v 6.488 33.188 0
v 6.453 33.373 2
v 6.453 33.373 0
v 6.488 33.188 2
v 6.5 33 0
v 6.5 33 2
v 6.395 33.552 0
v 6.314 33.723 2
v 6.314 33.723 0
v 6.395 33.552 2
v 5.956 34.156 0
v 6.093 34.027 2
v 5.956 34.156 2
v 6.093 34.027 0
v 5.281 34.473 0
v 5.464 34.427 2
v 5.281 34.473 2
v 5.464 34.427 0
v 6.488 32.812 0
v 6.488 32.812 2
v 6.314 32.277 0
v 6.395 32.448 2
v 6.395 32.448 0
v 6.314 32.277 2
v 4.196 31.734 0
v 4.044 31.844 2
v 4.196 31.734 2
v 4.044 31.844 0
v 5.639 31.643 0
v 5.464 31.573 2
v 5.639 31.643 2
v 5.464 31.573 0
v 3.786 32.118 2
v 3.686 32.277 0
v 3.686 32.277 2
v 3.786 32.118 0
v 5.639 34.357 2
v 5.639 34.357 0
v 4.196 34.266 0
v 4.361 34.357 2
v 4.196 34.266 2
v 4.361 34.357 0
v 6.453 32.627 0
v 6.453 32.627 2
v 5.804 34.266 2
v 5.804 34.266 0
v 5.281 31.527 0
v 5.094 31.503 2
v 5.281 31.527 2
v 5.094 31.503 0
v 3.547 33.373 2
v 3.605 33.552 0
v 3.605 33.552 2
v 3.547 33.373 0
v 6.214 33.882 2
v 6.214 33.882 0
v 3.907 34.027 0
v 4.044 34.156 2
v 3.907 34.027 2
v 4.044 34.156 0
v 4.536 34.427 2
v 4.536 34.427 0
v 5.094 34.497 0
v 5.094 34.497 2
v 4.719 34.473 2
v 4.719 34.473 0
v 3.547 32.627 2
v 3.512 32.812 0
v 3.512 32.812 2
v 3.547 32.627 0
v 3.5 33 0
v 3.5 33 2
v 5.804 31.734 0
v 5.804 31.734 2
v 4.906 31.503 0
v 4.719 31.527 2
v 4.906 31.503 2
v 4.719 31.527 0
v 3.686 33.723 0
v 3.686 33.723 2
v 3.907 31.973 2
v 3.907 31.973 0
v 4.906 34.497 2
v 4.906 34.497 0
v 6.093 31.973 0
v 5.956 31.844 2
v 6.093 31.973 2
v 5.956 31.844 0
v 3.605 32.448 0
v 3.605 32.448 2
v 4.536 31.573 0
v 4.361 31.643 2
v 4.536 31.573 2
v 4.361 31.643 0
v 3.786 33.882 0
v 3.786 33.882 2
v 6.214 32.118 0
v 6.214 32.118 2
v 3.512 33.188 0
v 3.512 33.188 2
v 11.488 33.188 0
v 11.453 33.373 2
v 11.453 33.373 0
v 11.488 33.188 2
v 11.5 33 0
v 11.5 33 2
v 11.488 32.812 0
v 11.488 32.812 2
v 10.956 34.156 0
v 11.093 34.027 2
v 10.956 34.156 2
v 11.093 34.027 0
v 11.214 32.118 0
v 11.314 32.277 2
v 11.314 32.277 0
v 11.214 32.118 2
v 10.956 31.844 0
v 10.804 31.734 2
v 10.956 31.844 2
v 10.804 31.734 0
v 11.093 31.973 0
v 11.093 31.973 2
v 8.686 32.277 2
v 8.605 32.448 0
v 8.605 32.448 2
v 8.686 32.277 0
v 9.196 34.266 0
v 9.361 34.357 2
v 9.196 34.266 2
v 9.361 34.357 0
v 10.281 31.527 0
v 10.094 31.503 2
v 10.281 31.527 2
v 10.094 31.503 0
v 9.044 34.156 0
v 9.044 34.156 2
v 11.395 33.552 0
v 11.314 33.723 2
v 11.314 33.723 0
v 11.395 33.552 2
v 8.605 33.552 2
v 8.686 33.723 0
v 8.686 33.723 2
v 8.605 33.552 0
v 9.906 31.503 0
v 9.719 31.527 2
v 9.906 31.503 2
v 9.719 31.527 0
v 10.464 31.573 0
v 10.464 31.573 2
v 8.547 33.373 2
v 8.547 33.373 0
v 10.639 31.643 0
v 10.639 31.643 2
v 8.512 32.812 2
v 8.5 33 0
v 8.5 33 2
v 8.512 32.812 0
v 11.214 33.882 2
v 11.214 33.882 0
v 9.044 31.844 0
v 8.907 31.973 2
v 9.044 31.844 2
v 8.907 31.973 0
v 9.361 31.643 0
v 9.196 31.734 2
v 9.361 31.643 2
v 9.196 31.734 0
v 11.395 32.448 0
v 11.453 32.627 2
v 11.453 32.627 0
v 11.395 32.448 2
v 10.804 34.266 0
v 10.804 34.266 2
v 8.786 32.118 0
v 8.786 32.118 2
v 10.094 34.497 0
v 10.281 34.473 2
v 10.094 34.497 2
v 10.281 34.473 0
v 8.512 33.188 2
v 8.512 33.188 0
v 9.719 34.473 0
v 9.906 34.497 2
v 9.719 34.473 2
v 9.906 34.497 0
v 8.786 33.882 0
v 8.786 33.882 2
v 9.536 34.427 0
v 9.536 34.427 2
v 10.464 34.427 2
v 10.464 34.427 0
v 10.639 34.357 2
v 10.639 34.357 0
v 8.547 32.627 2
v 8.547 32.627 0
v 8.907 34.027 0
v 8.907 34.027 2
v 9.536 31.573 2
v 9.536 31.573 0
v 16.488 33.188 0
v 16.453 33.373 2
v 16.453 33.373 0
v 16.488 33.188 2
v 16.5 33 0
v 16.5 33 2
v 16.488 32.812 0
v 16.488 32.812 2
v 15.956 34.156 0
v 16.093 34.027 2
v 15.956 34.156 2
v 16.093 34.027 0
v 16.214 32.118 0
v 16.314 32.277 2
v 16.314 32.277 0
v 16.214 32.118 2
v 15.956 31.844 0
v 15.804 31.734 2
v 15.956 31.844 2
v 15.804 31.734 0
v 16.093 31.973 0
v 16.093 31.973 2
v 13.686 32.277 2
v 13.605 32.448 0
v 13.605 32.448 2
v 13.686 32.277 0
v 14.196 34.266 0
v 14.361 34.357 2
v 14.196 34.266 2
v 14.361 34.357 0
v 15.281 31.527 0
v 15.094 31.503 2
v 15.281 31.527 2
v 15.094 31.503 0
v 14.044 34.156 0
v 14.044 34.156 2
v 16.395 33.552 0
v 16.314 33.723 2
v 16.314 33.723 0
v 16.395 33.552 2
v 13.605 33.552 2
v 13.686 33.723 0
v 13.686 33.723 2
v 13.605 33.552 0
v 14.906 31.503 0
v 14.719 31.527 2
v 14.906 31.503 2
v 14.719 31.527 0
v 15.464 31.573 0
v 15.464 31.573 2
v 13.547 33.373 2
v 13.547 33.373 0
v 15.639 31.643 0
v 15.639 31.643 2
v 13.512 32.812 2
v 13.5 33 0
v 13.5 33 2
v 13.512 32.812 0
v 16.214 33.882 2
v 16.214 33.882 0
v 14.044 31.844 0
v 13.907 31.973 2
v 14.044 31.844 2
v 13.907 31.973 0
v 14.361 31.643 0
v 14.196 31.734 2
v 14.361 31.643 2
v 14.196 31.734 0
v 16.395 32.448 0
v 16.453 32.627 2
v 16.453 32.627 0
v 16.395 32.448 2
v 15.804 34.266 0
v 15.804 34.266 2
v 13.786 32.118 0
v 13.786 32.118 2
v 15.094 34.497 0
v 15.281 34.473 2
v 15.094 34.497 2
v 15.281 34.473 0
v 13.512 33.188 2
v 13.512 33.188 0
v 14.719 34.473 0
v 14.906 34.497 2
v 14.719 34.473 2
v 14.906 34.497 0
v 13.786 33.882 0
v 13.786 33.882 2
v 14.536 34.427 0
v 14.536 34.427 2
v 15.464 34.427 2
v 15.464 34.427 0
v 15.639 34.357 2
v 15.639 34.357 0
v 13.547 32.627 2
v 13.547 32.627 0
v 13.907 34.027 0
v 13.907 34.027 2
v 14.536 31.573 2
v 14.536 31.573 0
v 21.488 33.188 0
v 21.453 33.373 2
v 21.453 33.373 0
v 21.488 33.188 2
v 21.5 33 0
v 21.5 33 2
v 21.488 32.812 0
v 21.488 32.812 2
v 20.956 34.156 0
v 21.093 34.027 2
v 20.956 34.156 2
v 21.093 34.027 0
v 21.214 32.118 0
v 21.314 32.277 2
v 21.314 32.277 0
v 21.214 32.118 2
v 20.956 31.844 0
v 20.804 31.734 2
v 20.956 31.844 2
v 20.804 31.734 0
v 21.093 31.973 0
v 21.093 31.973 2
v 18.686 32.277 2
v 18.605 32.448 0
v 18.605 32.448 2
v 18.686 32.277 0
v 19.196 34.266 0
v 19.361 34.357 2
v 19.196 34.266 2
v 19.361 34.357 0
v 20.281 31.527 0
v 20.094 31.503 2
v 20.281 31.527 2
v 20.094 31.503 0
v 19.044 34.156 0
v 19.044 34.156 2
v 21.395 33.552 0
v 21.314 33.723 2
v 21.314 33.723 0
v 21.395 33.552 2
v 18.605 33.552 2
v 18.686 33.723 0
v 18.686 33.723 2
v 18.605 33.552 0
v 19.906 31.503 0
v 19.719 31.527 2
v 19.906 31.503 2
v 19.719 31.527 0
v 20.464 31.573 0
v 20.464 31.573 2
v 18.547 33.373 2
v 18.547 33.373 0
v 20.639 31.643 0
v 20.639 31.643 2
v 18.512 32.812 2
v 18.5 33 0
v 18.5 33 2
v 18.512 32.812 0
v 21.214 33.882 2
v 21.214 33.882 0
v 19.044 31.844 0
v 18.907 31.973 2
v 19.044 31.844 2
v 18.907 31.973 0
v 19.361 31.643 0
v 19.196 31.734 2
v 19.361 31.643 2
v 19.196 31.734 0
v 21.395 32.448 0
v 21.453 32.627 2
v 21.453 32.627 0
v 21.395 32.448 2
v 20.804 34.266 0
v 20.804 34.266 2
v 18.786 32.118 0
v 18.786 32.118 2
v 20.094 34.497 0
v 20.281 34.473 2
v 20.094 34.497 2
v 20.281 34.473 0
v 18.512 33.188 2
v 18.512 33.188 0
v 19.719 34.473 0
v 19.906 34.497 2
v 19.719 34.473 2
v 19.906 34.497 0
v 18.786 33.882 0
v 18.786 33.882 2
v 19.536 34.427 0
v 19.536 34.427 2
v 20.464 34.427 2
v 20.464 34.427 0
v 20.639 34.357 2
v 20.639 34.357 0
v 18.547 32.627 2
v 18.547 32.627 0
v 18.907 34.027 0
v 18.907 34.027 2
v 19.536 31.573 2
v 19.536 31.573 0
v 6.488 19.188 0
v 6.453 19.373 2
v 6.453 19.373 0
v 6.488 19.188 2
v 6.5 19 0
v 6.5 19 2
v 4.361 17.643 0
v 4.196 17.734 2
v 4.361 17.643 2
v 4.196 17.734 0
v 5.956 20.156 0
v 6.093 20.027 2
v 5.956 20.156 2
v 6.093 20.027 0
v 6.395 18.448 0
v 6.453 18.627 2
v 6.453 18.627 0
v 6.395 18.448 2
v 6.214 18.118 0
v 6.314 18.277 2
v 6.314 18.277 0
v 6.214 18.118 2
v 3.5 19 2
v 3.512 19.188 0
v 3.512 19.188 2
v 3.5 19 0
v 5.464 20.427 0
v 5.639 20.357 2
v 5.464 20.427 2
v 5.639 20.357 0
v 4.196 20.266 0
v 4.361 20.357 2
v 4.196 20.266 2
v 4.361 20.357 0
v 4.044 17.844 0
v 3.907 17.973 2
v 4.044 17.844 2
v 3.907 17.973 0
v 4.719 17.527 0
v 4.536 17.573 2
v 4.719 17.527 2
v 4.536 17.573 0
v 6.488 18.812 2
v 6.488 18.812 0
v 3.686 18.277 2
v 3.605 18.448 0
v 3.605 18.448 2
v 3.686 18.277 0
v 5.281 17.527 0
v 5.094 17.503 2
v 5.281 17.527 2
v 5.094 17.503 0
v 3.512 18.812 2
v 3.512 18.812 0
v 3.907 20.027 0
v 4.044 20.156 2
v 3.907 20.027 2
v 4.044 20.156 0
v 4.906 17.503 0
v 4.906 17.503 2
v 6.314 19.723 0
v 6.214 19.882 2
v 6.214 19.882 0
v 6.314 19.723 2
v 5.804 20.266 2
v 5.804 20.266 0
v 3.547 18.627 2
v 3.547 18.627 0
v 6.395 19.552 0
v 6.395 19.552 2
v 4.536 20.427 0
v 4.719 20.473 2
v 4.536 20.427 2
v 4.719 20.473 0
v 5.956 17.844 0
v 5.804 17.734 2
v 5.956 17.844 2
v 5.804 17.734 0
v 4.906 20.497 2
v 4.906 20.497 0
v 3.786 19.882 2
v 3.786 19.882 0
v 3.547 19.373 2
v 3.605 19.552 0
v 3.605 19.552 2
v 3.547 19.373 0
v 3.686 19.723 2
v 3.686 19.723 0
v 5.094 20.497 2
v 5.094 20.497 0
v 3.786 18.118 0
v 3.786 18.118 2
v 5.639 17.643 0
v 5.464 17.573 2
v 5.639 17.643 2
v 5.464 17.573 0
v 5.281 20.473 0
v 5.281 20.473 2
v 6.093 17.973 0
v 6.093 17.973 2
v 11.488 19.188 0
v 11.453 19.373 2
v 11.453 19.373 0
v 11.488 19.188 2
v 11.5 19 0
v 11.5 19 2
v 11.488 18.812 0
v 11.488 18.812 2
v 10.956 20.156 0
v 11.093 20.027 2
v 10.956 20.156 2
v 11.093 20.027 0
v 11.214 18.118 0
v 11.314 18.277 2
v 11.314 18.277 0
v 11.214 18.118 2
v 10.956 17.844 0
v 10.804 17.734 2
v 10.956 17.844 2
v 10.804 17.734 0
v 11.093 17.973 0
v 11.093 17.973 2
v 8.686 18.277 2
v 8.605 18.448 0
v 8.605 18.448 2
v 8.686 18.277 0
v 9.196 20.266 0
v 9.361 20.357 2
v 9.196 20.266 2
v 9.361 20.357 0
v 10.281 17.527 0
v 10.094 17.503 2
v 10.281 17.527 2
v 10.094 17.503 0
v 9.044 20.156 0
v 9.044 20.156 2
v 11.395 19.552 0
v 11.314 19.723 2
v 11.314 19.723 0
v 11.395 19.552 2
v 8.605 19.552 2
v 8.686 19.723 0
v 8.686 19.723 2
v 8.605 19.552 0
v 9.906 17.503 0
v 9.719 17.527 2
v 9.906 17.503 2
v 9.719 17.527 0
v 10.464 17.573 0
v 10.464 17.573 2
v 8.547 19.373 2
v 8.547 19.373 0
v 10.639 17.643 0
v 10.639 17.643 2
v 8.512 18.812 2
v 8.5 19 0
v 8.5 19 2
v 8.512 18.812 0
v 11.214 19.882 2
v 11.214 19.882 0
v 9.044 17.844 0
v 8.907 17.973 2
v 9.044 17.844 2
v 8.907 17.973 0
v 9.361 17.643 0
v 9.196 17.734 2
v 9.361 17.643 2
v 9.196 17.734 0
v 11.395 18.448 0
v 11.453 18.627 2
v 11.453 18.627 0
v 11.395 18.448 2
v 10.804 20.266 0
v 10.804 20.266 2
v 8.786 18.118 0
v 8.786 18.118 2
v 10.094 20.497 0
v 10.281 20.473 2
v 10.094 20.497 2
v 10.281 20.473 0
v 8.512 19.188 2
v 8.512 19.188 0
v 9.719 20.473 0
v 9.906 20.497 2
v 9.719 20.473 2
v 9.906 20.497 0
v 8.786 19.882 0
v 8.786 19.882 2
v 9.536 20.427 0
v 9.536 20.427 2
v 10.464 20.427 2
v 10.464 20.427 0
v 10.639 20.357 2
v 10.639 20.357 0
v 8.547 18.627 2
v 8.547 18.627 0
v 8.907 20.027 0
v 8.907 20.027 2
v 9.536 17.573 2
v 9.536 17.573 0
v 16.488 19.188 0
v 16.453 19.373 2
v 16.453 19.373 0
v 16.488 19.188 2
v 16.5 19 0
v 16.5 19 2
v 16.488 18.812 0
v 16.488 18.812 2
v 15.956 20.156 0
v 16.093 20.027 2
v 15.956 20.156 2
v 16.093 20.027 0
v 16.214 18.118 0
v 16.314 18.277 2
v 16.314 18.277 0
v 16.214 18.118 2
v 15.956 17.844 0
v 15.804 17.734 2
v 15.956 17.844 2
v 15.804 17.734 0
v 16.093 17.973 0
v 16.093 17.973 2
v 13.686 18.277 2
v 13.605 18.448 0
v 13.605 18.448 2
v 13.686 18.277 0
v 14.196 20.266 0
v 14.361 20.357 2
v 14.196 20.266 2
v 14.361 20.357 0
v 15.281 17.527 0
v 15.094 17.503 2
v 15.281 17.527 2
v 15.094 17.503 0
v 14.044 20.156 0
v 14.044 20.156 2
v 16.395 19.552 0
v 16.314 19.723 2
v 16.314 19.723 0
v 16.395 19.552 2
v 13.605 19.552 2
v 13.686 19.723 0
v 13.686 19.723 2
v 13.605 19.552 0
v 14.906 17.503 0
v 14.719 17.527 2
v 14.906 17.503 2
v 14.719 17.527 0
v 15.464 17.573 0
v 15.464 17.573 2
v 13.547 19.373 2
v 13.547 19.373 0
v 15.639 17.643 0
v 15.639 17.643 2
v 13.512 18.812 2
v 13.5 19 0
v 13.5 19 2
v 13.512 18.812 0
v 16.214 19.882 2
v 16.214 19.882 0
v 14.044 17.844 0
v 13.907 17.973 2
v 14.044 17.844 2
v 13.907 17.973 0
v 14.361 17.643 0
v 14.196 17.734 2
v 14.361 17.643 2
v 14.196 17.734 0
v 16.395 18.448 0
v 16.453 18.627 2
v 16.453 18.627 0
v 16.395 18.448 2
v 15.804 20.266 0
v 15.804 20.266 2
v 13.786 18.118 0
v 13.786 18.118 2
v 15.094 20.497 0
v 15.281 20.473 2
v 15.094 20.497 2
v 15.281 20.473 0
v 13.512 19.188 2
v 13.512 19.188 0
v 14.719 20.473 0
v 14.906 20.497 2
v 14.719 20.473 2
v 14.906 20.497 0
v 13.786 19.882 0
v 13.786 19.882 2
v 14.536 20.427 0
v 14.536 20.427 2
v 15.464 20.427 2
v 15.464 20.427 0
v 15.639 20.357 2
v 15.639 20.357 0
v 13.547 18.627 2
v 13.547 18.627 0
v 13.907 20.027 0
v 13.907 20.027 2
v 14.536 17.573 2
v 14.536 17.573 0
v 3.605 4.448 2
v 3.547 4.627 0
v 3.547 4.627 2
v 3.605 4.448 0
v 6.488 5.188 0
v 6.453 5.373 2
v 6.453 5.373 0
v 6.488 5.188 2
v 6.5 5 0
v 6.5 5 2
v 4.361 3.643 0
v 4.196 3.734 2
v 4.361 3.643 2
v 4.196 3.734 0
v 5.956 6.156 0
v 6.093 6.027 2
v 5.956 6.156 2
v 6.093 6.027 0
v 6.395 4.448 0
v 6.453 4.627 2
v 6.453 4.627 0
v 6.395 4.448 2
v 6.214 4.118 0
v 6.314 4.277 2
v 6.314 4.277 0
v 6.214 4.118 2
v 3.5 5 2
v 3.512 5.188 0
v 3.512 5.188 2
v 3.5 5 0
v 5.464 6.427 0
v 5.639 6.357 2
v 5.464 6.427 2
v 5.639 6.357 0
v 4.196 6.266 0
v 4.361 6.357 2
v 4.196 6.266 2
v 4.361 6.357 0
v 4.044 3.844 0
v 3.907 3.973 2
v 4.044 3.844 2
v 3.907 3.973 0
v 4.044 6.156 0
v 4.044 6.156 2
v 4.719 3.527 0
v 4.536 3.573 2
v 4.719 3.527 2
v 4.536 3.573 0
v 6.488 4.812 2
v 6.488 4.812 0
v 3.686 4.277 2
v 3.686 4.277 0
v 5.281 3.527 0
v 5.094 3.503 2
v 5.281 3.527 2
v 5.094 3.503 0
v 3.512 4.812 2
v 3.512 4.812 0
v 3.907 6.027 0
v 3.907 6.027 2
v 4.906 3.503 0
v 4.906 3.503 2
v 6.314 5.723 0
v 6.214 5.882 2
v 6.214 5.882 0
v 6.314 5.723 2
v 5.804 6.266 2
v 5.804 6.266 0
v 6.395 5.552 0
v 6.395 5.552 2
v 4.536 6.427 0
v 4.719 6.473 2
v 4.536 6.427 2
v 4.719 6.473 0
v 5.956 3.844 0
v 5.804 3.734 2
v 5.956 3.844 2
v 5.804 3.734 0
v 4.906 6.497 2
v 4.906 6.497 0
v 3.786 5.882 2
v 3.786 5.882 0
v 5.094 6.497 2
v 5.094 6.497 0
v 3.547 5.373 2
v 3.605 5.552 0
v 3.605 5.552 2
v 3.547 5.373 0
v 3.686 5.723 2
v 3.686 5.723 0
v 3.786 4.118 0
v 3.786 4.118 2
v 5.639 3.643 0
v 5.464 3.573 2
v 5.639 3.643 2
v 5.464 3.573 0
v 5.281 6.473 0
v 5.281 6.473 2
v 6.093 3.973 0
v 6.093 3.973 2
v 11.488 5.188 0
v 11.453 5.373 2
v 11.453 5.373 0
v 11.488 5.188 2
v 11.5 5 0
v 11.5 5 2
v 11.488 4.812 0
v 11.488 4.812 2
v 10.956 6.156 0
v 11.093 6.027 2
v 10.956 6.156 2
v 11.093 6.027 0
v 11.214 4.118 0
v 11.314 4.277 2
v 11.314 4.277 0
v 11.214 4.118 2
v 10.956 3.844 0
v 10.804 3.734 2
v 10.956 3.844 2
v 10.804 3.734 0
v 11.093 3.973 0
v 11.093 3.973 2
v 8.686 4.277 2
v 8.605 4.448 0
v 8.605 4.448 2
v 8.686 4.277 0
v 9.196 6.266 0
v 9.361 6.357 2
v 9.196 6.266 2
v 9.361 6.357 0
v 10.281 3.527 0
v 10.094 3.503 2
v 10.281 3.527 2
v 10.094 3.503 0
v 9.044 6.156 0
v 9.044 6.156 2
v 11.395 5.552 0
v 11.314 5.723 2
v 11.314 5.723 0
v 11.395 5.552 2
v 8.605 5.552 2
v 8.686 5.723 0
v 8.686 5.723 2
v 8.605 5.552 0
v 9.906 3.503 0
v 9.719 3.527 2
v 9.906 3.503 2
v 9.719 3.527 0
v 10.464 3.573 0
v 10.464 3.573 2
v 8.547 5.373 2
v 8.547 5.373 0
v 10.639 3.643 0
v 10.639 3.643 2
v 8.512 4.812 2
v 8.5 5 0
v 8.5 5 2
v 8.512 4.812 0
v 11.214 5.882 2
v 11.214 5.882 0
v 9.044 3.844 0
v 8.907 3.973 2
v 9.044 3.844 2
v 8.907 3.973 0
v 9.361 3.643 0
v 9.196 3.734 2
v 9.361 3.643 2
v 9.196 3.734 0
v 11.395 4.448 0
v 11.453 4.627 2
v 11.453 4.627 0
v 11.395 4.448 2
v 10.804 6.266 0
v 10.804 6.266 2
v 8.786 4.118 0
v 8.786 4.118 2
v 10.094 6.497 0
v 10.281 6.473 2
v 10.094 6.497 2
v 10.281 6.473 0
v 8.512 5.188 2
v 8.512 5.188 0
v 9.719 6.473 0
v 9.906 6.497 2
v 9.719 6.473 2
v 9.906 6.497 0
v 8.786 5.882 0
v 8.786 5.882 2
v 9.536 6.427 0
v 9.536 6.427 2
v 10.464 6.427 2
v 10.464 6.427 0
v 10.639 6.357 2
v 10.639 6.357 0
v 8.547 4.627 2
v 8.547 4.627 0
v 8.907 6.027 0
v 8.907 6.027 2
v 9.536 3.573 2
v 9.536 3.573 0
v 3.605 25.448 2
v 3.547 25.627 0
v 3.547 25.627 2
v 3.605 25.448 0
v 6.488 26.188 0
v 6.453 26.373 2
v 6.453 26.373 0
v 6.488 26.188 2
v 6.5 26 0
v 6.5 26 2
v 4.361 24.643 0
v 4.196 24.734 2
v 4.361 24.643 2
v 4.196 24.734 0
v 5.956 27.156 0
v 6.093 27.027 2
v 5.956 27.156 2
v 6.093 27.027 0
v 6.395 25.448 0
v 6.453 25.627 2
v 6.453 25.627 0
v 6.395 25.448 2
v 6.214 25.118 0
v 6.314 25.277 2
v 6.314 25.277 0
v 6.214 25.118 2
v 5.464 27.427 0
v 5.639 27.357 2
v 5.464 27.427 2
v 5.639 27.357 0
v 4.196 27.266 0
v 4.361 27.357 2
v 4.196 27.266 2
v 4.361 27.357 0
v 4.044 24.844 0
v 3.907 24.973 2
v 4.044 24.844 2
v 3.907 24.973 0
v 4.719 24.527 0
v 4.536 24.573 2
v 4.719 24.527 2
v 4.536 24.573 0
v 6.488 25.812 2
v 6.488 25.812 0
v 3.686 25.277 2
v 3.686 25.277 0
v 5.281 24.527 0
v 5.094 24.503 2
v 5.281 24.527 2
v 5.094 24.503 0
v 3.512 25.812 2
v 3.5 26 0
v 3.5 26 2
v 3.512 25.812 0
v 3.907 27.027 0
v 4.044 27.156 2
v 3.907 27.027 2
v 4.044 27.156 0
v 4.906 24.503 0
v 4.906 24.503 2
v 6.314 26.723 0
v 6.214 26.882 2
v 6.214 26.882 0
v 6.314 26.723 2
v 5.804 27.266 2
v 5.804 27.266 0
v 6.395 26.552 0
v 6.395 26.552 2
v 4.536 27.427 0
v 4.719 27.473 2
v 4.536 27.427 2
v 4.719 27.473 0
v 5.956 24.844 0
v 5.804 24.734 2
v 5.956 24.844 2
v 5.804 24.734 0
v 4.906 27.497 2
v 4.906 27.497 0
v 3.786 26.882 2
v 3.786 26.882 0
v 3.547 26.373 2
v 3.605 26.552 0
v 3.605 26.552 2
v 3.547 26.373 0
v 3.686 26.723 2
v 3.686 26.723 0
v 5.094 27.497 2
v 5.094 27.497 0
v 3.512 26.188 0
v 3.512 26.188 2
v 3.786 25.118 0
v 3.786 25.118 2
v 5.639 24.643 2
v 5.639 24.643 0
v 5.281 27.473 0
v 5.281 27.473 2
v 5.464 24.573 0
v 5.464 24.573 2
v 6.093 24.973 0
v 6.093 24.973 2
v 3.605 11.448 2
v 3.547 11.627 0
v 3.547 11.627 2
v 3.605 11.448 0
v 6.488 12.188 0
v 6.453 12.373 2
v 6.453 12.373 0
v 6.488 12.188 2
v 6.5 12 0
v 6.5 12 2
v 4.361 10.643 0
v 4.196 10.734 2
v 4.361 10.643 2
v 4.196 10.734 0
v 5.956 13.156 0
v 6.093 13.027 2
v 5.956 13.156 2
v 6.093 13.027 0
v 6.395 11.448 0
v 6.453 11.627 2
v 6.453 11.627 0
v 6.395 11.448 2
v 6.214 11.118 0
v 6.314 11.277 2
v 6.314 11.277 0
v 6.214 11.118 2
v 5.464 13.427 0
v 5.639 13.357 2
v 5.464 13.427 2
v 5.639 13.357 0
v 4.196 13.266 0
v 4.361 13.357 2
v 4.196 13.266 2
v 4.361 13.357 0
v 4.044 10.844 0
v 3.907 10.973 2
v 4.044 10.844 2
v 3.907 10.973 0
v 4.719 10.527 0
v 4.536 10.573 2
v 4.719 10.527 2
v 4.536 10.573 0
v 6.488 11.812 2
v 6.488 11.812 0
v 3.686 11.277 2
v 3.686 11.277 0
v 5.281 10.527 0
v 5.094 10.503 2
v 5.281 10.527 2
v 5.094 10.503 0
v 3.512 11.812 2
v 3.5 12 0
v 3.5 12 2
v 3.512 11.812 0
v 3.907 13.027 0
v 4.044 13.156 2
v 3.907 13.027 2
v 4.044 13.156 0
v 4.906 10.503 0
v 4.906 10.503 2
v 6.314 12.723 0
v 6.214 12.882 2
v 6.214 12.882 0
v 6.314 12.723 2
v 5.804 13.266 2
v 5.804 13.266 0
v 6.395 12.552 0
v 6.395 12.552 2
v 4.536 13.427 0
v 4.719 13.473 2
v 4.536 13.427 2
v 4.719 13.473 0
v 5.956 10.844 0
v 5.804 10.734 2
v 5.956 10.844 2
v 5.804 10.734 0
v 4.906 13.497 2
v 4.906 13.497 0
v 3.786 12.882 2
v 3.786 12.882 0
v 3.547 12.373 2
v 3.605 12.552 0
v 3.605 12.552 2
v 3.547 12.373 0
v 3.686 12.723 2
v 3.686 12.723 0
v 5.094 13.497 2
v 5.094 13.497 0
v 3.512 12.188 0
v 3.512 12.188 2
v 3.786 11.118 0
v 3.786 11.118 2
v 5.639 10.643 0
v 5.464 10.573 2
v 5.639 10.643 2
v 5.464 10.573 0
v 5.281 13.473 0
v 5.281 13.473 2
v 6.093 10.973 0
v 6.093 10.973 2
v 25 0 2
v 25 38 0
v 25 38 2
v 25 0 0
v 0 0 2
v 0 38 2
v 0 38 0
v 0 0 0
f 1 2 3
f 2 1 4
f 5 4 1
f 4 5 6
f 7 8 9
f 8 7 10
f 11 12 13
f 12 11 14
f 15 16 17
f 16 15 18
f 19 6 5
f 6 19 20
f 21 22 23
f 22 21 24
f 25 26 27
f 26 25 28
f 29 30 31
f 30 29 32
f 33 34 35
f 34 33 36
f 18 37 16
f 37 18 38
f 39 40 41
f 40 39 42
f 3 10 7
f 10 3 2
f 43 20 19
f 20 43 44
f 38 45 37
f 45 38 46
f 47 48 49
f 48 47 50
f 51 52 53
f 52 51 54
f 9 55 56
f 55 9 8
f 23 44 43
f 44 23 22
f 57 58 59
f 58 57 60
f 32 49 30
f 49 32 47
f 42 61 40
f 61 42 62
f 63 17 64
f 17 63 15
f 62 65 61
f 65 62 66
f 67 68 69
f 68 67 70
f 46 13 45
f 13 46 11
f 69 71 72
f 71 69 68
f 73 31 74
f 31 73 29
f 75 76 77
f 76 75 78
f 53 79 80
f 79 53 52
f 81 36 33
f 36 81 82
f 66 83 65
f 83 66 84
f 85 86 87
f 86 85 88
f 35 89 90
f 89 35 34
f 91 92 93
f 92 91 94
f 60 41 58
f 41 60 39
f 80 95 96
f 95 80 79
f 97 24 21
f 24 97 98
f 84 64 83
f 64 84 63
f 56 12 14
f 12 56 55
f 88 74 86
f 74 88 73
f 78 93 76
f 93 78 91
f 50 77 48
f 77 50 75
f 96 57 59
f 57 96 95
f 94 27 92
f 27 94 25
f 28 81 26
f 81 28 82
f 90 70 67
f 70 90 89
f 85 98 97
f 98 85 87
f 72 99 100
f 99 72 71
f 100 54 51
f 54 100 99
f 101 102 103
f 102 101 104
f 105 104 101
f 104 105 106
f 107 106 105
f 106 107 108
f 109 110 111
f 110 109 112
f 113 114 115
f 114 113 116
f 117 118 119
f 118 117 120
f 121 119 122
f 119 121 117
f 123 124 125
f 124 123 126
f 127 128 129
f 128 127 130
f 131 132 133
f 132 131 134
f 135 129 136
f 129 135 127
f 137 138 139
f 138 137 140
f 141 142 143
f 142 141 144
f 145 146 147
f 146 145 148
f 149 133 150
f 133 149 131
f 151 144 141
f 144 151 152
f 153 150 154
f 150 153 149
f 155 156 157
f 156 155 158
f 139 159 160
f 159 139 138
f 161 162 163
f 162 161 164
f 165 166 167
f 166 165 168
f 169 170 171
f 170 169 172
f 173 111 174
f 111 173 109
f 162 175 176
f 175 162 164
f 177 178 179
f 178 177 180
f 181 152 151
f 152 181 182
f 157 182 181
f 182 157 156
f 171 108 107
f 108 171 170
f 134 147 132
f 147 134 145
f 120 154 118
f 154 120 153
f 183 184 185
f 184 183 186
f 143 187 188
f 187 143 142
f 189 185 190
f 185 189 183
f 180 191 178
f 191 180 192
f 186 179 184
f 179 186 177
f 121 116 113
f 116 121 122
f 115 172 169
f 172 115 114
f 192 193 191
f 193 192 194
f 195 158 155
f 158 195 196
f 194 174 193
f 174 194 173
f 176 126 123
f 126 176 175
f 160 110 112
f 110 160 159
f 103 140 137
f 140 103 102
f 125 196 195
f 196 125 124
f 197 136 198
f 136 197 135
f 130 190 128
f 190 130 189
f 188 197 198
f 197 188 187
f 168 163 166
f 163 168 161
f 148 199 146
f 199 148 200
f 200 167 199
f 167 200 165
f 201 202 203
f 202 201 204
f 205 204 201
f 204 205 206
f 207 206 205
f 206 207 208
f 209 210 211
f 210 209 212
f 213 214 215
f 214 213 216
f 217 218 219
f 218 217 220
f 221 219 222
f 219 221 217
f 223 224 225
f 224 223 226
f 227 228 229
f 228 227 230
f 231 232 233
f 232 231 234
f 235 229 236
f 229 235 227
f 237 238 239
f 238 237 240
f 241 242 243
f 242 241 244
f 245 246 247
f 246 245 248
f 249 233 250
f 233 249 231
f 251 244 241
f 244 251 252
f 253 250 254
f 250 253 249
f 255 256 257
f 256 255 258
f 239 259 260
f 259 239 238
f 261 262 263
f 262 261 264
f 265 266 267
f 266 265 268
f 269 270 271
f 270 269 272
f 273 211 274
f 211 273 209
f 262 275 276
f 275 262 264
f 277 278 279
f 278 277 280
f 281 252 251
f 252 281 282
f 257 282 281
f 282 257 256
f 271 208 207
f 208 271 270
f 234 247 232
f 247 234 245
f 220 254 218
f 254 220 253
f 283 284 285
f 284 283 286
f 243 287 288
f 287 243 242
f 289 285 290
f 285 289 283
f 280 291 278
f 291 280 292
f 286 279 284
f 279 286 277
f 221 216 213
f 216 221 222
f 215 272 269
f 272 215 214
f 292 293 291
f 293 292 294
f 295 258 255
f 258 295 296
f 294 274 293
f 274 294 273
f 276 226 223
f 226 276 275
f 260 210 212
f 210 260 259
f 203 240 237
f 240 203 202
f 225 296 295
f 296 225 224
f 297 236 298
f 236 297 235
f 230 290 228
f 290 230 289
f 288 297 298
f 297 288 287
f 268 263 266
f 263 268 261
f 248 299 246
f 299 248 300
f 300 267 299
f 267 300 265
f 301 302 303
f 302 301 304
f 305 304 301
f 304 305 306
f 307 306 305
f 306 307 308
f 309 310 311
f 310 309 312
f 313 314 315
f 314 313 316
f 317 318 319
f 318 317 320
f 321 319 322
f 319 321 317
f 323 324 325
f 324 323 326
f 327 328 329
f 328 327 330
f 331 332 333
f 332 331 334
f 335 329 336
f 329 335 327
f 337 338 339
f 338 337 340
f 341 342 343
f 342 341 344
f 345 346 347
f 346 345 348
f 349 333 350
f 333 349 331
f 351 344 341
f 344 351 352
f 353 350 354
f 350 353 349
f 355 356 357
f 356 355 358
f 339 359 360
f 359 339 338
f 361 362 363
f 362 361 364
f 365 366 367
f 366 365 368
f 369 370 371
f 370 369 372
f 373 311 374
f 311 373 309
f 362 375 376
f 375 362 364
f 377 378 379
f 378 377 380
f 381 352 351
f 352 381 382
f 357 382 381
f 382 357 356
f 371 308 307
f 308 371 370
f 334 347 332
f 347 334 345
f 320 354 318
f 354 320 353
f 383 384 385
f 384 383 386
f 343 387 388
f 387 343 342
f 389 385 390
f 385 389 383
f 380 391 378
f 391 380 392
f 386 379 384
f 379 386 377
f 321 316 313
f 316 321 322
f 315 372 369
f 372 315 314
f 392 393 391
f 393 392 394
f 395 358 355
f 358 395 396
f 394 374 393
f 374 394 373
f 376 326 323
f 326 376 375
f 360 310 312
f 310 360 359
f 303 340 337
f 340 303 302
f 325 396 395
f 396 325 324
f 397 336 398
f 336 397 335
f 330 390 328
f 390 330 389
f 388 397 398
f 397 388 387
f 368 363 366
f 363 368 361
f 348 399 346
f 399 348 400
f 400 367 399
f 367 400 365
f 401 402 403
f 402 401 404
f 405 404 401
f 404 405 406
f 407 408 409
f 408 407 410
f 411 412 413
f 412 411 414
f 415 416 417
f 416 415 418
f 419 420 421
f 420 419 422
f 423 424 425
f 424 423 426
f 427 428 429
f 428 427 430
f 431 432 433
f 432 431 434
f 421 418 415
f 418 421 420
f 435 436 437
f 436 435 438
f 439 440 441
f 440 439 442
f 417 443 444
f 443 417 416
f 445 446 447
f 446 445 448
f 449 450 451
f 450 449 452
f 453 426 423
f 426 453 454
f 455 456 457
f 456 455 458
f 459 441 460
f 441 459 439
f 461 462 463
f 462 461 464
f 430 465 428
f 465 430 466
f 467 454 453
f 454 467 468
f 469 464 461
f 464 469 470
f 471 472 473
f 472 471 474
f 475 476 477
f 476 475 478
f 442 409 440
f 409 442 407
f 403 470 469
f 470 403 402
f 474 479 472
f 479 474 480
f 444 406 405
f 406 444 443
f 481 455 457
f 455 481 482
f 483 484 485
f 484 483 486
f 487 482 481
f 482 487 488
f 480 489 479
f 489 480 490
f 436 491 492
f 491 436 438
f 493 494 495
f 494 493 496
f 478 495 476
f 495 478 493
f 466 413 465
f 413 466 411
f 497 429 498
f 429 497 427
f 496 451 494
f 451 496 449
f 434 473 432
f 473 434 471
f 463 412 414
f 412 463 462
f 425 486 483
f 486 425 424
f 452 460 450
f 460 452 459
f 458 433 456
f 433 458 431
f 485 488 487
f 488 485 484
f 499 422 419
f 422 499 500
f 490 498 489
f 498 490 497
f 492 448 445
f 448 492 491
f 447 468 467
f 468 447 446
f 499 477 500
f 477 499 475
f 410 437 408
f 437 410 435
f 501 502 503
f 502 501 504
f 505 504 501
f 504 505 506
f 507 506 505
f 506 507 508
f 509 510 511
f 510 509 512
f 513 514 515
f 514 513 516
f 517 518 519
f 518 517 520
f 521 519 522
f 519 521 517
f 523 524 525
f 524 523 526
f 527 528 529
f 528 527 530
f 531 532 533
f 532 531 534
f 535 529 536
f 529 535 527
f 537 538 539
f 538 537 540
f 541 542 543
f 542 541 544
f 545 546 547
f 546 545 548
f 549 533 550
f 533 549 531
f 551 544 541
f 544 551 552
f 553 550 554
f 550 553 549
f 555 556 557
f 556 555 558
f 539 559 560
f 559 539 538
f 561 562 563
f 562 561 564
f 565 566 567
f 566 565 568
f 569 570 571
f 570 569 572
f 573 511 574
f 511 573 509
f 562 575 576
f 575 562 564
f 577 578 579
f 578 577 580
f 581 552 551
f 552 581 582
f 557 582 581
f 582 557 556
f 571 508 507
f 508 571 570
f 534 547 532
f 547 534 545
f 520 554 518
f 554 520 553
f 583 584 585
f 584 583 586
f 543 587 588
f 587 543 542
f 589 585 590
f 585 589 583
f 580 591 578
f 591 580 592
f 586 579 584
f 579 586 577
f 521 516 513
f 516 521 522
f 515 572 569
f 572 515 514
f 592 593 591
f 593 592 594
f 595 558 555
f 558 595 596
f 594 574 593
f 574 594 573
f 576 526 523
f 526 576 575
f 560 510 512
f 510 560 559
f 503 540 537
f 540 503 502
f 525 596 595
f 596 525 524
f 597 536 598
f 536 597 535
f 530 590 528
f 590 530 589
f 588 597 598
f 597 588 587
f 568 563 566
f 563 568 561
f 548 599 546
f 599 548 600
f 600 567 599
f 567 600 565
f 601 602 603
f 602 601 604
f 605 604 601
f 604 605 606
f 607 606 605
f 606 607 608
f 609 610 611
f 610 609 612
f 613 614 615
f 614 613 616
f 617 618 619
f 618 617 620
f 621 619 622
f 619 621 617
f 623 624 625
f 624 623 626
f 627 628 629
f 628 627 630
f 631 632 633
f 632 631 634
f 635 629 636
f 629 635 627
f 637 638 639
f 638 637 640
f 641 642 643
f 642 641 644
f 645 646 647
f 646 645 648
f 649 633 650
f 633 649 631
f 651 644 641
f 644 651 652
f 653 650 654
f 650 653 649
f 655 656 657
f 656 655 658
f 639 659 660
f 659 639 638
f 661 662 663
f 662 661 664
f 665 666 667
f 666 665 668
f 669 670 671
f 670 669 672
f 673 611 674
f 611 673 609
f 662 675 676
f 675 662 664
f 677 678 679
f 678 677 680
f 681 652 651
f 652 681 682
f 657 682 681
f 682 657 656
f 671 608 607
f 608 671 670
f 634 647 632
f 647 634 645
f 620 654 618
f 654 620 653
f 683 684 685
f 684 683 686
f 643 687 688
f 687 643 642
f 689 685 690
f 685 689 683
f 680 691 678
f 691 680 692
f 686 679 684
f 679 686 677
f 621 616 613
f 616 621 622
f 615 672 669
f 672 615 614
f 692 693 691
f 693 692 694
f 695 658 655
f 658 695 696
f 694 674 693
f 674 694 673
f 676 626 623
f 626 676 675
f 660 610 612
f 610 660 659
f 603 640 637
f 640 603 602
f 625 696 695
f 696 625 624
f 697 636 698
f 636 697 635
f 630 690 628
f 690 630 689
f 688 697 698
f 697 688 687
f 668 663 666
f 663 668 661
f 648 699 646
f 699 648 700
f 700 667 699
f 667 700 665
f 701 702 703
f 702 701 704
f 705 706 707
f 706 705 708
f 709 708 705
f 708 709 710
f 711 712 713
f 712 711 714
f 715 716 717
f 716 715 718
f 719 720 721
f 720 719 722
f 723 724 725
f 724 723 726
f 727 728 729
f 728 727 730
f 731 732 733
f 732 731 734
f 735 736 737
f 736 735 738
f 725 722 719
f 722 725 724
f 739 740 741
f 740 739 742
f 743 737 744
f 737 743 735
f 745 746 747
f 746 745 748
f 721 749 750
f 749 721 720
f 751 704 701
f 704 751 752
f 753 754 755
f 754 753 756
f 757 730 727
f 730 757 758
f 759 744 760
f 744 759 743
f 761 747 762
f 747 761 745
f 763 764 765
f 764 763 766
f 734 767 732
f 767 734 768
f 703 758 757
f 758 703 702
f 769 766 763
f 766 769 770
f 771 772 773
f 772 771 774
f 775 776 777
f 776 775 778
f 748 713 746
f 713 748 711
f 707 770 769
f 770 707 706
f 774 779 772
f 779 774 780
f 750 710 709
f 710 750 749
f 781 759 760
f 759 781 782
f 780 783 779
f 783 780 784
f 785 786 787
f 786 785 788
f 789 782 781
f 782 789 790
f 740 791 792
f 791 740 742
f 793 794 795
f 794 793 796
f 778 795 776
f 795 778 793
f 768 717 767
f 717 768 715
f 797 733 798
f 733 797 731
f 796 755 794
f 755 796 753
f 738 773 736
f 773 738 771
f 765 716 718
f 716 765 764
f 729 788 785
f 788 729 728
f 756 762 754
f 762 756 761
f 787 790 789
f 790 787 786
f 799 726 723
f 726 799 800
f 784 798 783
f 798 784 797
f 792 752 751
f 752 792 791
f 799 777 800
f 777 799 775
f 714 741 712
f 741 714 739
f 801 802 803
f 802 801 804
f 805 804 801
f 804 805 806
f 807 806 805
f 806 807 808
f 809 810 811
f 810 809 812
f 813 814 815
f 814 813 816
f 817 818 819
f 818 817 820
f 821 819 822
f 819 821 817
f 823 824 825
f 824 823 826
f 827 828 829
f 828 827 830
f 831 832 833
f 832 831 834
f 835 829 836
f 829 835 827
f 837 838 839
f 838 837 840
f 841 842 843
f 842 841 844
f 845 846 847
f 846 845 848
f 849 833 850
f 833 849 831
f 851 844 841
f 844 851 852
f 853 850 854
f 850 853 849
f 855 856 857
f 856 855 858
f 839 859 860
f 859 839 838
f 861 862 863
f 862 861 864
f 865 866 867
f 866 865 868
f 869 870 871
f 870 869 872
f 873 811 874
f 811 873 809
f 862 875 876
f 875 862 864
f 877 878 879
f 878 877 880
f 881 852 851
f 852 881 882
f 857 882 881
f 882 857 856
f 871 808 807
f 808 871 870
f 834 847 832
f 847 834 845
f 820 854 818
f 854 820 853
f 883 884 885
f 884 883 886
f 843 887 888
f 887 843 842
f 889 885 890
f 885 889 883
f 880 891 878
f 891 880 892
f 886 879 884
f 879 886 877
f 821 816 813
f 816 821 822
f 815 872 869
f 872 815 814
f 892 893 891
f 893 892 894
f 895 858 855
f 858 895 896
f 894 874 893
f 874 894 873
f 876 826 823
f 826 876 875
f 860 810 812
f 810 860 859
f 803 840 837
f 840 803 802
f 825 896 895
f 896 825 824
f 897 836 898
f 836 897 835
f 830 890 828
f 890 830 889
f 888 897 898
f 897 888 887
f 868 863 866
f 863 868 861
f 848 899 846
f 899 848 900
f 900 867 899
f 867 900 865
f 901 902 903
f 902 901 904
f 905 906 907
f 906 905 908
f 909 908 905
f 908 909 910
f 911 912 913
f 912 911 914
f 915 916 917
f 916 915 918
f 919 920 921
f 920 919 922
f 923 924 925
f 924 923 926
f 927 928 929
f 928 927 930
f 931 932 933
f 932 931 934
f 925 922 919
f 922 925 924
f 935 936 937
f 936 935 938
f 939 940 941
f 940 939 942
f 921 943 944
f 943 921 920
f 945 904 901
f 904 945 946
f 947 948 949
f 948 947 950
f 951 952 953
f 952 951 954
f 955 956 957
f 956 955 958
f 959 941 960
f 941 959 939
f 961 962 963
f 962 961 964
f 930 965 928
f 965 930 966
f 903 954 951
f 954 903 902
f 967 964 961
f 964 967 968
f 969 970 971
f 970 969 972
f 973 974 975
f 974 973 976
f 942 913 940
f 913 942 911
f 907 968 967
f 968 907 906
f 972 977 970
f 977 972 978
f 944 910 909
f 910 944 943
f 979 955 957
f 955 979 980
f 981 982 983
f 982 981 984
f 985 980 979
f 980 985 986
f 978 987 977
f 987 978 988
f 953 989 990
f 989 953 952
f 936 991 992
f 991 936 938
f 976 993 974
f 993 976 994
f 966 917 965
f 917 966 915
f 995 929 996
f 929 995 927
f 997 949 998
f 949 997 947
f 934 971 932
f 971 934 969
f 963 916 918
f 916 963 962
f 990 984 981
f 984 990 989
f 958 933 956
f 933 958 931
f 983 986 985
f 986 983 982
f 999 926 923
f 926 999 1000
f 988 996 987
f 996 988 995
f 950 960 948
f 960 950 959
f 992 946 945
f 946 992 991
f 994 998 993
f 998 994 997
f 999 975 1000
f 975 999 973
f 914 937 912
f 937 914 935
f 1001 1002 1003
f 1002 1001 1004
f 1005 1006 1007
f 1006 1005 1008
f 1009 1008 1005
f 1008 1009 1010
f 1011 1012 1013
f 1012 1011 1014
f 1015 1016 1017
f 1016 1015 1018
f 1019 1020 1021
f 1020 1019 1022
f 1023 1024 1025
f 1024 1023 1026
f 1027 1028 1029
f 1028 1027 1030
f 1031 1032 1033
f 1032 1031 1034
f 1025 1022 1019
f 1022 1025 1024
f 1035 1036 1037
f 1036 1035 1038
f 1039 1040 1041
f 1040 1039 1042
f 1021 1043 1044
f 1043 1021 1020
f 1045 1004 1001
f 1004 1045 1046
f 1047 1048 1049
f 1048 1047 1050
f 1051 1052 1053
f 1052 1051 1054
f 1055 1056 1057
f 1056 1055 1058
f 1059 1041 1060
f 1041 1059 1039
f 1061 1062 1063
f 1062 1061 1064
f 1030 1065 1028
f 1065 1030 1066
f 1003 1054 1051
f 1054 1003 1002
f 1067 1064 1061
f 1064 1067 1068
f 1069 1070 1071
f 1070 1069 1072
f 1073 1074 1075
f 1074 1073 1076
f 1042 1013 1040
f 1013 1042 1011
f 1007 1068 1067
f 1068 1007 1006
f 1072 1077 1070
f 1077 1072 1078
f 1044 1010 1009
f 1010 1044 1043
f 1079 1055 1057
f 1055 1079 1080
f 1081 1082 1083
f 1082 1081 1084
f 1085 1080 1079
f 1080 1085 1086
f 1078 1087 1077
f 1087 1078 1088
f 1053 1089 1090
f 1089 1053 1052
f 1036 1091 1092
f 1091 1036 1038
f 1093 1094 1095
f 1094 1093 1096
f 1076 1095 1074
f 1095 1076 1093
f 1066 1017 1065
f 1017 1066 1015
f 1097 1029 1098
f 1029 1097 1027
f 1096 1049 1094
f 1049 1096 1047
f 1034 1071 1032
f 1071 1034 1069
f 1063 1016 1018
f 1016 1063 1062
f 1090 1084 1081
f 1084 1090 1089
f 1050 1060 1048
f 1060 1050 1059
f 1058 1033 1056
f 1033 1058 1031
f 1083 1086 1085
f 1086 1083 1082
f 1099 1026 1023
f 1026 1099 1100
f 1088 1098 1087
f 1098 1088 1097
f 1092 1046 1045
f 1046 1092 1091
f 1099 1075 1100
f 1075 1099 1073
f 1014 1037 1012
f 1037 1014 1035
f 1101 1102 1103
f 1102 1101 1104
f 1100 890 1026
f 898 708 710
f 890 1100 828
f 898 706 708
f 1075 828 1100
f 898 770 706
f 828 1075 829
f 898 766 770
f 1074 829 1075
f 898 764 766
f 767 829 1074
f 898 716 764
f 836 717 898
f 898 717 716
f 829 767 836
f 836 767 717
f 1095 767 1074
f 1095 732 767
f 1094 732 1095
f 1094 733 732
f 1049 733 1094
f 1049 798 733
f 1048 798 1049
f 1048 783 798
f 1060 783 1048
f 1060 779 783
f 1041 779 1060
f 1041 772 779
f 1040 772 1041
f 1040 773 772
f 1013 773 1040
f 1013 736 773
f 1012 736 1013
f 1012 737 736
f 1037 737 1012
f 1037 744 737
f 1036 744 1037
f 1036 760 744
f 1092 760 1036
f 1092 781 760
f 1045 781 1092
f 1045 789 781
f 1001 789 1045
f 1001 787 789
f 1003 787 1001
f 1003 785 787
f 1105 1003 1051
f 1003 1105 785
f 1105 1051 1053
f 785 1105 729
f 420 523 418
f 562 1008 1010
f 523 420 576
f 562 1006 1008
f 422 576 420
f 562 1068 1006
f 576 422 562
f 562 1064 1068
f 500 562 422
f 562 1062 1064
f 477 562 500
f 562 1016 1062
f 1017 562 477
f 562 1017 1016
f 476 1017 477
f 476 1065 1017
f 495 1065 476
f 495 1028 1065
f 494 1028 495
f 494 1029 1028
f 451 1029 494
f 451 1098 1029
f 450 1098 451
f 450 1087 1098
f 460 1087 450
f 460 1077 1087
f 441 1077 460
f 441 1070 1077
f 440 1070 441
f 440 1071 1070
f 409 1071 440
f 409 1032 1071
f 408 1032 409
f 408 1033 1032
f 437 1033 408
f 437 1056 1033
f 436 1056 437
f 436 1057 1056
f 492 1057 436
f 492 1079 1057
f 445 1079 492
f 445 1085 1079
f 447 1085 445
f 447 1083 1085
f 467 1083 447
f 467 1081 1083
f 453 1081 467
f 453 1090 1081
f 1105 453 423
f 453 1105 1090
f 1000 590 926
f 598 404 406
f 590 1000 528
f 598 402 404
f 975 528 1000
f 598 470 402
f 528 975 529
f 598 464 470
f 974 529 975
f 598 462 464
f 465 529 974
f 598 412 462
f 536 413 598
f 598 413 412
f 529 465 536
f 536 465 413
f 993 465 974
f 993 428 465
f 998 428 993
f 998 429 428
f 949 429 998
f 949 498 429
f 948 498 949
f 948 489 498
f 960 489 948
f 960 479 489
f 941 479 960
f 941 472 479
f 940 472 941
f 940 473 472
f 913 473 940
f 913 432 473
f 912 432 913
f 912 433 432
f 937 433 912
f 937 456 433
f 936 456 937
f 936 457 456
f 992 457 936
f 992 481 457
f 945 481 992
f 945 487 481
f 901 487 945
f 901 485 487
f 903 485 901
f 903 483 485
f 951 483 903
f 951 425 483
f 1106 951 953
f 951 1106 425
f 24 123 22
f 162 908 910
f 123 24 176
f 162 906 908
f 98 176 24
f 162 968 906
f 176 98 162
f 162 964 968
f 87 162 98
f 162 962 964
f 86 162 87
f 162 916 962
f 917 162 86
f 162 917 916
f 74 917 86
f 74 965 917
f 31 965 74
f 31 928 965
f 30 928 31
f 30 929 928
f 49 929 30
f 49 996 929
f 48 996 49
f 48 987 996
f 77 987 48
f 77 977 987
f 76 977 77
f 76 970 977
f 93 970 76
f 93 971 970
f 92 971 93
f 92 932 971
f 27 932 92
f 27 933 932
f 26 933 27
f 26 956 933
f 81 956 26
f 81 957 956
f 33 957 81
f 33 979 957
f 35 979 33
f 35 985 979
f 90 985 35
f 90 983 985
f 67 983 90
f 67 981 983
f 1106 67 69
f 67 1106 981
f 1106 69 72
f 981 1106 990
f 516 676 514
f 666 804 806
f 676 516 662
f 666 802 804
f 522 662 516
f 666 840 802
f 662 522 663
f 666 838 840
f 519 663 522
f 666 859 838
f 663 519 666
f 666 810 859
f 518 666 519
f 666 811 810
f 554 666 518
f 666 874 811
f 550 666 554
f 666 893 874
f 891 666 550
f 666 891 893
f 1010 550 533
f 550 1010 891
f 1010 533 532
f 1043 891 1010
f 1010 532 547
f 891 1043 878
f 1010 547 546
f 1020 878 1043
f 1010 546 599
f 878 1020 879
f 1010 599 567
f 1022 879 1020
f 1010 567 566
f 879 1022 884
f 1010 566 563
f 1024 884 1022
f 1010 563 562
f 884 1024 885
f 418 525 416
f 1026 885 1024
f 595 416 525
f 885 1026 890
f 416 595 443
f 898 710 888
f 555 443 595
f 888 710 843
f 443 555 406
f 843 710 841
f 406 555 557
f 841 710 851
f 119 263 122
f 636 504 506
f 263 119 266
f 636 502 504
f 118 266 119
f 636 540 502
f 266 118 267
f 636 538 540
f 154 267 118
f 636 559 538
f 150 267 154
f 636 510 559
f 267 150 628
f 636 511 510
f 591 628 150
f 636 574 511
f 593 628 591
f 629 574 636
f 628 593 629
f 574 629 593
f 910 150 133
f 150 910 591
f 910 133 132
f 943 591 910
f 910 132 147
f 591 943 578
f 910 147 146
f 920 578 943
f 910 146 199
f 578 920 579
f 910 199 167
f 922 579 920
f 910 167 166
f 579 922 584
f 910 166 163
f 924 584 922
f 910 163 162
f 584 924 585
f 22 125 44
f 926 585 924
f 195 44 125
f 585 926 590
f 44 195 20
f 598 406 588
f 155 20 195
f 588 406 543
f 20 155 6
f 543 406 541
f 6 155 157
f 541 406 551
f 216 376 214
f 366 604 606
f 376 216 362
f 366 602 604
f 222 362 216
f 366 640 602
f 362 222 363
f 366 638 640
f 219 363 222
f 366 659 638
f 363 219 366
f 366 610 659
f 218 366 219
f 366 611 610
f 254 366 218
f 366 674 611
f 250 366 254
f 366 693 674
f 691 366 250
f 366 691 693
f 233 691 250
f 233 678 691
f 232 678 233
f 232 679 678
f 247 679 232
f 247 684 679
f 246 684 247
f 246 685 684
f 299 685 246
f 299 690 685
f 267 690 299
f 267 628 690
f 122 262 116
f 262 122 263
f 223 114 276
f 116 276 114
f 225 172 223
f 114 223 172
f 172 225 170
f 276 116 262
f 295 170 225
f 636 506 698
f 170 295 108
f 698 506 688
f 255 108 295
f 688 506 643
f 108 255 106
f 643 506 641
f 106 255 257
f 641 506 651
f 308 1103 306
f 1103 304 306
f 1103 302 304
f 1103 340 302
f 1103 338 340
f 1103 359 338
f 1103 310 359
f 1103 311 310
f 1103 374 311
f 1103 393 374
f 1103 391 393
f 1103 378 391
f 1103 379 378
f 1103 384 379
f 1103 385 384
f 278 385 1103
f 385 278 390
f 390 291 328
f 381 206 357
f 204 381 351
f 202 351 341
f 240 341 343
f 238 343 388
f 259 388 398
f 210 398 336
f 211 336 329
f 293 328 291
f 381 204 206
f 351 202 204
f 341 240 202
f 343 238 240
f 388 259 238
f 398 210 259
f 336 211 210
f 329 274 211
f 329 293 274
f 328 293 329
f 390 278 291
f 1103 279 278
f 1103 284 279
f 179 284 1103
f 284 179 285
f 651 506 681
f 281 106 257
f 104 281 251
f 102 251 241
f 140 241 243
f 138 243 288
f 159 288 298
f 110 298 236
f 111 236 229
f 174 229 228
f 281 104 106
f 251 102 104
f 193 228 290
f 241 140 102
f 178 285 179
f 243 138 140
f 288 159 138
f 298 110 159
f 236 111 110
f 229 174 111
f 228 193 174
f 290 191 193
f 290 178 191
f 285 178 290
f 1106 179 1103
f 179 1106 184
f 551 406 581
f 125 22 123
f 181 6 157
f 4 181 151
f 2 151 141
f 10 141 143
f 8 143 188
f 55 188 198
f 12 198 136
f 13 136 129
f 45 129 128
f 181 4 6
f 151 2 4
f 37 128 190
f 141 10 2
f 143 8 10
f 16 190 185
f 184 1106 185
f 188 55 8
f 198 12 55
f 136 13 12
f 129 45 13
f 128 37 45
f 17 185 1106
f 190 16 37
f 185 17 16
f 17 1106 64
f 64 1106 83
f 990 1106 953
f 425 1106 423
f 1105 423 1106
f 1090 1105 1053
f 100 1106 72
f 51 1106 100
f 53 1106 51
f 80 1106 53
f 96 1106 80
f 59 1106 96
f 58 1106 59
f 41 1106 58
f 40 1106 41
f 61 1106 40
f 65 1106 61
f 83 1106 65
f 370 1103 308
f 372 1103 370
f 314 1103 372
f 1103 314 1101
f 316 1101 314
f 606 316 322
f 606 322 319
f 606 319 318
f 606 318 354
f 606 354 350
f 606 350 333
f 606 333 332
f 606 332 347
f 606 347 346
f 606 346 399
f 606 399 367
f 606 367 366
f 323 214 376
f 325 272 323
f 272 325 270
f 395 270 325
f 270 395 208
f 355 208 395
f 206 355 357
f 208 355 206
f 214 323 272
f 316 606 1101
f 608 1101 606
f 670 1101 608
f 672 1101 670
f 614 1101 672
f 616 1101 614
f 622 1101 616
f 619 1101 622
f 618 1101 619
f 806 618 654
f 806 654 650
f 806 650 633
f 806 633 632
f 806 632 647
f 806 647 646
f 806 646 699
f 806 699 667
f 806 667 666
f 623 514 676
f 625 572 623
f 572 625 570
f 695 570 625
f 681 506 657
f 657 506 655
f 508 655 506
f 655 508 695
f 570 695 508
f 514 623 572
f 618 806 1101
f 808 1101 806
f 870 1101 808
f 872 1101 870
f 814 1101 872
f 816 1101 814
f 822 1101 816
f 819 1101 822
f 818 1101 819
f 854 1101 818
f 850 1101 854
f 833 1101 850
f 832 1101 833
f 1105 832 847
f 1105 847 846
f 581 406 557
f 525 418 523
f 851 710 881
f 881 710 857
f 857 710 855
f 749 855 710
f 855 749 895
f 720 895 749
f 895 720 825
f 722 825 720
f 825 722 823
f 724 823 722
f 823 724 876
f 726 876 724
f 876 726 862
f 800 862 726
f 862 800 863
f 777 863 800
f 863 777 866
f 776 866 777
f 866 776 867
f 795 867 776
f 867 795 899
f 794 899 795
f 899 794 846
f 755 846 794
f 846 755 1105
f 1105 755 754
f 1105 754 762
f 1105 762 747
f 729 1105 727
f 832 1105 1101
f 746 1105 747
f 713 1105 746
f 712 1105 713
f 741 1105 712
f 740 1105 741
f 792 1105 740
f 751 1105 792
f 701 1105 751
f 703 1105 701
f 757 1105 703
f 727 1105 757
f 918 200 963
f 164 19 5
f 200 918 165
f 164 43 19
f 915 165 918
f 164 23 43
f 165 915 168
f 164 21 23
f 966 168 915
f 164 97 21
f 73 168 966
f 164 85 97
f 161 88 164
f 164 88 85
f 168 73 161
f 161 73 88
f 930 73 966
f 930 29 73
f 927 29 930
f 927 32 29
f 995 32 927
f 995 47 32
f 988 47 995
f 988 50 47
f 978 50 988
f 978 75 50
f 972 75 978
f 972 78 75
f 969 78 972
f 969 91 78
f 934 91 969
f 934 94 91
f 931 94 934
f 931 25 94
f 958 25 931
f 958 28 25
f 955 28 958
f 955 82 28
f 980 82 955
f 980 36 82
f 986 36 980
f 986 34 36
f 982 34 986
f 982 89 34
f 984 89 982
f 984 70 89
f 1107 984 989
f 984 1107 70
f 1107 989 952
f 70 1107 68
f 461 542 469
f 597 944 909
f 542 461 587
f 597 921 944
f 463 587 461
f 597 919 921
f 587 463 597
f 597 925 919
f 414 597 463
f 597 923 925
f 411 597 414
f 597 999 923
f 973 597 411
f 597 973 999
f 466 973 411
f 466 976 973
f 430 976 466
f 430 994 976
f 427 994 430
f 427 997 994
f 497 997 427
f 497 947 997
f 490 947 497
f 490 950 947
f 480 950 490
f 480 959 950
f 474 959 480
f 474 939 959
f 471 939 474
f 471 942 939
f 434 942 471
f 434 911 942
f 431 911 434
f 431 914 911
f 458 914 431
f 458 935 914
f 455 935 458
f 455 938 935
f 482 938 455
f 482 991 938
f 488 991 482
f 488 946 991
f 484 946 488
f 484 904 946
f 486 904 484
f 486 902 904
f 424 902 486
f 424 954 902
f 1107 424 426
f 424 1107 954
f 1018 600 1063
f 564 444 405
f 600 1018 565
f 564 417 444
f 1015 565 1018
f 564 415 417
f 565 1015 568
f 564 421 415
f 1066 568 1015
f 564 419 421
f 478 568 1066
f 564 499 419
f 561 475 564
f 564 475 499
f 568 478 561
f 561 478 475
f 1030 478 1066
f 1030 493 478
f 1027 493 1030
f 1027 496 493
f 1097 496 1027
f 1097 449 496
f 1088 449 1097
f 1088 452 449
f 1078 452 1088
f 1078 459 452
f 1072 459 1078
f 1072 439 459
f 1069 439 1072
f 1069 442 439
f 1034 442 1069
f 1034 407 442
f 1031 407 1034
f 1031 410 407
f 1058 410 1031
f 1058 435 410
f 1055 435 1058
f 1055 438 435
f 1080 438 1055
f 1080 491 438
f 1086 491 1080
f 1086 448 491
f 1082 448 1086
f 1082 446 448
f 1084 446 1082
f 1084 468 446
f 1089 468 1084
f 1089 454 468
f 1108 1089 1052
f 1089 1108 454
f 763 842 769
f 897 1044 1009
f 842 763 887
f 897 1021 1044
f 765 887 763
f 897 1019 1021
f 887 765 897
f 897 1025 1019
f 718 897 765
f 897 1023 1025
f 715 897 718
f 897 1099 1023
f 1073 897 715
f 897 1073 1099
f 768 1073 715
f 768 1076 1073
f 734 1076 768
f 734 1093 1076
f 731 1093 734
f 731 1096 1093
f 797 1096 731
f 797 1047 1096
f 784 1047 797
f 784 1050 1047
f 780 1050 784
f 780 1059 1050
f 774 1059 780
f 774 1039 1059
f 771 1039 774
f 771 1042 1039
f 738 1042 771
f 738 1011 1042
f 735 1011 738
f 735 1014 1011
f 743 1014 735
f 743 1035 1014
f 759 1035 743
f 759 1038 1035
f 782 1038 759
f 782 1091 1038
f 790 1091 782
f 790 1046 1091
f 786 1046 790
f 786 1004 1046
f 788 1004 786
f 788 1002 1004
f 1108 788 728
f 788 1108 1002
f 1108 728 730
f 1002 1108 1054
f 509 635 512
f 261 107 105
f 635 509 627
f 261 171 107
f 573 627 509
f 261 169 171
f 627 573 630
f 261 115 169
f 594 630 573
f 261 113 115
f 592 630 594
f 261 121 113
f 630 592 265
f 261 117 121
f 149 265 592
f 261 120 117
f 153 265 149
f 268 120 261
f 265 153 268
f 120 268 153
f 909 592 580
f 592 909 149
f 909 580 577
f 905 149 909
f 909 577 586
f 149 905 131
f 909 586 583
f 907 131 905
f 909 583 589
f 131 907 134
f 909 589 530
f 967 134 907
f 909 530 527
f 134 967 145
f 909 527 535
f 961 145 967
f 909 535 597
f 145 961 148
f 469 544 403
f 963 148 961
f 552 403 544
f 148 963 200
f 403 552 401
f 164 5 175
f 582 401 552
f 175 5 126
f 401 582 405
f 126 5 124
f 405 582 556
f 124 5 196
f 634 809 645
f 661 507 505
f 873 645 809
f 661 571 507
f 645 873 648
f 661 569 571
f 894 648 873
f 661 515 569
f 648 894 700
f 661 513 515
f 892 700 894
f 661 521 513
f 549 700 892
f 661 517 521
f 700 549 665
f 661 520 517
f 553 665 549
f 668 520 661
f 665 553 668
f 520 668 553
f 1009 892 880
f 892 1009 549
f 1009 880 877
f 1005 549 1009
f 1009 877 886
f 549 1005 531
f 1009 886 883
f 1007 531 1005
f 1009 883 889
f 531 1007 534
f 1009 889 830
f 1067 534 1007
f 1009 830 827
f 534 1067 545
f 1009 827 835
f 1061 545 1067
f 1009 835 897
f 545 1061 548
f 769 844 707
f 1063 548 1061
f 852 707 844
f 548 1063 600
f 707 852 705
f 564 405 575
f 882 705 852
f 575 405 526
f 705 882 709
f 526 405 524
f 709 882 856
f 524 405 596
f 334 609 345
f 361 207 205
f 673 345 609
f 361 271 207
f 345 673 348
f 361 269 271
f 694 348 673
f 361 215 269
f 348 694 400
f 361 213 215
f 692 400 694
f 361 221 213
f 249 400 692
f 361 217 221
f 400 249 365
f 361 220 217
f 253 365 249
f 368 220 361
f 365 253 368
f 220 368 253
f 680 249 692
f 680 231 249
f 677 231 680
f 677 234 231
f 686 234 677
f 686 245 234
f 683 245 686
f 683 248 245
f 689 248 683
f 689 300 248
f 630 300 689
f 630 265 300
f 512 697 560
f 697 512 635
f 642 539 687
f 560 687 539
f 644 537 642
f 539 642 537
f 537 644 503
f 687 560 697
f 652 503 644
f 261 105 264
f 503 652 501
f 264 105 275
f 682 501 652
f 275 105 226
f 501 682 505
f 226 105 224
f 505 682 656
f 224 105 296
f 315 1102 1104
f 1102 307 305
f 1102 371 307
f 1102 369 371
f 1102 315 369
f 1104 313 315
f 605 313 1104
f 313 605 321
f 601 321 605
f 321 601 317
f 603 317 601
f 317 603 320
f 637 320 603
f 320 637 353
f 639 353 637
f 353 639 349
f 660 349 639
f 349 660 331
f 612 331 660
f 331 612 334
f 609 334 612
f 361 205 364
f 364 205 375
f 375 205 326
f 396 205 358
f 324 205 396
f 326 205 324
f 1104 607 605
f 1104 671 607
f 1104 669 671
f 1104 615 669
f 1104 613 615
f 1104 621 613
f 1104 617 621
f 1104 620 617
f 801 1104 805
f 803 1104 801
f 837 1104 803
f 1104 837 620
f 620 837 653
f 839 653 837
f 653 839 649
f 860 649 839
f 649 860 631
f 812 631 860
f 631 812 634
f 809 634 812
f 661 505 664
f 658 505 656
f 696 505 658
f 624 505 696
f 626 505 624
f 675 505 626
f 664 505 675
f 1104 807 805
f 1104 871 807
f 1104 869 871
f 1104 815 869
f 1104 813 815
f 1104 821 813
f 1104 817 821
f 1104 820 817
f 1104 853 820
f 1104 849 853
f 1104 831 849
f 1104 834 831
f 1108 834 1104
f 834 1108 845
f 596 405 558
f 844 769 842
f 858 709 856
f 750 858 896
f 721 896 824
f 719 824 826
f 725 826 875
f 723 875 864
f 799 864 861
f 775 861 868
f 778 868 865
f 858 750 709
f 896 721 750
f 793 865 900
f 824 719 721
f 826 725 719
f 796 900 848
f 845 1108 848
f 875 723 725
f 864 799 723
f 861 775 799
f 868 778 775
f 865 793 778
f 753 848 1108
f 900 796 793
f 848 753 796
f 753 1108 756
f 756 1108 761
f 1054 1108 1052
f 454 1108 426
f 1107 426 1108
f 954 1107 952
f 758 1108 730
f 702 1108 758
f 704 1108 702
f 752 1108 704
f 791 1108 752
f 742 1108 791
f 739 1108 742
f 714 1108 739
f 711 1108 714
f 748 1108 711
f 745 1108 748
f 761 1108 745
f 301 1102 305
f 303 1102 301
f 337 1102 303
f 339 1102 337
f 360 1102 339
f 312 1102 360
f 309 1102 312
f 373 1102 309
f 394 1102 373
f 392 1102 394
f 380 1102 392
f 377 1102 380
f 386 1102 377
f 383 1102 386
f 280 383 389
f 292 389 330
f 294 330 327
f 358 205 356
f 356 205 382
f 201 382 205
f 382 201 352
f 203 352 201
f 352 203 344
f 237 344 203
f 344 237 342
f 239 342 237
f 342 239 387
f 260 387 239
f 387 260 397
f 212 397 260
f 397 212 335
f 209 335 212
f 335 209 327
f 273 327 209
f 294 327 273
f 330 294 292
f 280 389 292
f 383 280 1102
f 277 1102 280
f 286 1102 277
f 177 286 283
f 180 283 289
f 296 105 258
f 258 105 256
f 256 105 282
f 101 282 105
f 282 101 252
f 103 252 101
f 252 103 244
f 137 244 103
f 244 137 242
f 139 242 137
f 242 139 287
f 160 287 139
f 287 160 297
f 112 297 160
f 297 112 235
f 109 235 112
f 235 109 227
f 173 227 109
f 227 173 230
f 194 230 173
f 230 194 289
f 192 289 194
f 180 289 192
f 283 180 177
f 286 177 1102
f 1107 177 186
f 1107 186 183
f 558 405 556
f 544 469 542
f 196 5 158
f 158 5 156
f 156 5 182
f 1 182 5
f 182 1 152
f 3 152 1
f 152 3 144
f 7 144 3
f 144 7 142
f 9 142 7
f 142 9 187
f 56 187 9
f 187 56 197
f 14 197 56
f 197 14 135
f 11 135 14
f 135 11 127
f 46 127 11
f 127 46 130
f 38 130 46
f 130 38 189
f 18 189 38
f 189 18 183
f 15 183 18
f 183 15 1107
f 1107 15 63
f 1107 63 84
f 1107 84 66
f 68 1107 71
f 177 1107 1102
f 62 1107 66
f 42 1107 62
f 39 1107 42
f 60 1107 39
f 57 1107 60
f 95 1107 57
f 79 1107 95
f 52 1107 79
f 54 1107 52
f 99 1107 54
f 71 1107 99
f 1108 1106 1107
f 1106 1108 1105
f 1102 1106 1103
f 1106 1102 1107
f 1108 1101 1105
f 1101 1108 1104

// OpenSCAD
$fn = 50;

led_r = 1.5;
margin_y = 5;
margin_x = 5;
base_skip_x = 5;
base_skip_y = 7;
thickness = 2;
eps = 0.05;

pattern = [
    [1, 1, 1, 1 ],
    [1, 0, 0, 0 ],
    [1, 1, 1, 0 ],
    [1, 0, 0, 0 ],
    [1, 1, 0 ,0 ]
];


rows = len(pattern);
cols = len(pattern[0]);

plate_w = (cols - 1) * base_skip_x + 2 * margin_x;
plate_h = (rows - 1) * base_skip_y + 2 * margin_y;

difference() {
    cube ([plate_w, plate_h, thickness]);

    translate([margin_x, margin_y + (rows - 1) * base_skip_y, 0])
        sieve();
}

module sieve() {
    for (y = [0 : rows - 1])
        for (x = [0 : cols - 1])
        {
            if (pattern[y][x] == 1)
                translate([x * base_skip_x, - y * base_skip_y, thickness / 2])
                    cylinder(r=led_r, h=thickness + 2 * eps, center=true);
        }
}
